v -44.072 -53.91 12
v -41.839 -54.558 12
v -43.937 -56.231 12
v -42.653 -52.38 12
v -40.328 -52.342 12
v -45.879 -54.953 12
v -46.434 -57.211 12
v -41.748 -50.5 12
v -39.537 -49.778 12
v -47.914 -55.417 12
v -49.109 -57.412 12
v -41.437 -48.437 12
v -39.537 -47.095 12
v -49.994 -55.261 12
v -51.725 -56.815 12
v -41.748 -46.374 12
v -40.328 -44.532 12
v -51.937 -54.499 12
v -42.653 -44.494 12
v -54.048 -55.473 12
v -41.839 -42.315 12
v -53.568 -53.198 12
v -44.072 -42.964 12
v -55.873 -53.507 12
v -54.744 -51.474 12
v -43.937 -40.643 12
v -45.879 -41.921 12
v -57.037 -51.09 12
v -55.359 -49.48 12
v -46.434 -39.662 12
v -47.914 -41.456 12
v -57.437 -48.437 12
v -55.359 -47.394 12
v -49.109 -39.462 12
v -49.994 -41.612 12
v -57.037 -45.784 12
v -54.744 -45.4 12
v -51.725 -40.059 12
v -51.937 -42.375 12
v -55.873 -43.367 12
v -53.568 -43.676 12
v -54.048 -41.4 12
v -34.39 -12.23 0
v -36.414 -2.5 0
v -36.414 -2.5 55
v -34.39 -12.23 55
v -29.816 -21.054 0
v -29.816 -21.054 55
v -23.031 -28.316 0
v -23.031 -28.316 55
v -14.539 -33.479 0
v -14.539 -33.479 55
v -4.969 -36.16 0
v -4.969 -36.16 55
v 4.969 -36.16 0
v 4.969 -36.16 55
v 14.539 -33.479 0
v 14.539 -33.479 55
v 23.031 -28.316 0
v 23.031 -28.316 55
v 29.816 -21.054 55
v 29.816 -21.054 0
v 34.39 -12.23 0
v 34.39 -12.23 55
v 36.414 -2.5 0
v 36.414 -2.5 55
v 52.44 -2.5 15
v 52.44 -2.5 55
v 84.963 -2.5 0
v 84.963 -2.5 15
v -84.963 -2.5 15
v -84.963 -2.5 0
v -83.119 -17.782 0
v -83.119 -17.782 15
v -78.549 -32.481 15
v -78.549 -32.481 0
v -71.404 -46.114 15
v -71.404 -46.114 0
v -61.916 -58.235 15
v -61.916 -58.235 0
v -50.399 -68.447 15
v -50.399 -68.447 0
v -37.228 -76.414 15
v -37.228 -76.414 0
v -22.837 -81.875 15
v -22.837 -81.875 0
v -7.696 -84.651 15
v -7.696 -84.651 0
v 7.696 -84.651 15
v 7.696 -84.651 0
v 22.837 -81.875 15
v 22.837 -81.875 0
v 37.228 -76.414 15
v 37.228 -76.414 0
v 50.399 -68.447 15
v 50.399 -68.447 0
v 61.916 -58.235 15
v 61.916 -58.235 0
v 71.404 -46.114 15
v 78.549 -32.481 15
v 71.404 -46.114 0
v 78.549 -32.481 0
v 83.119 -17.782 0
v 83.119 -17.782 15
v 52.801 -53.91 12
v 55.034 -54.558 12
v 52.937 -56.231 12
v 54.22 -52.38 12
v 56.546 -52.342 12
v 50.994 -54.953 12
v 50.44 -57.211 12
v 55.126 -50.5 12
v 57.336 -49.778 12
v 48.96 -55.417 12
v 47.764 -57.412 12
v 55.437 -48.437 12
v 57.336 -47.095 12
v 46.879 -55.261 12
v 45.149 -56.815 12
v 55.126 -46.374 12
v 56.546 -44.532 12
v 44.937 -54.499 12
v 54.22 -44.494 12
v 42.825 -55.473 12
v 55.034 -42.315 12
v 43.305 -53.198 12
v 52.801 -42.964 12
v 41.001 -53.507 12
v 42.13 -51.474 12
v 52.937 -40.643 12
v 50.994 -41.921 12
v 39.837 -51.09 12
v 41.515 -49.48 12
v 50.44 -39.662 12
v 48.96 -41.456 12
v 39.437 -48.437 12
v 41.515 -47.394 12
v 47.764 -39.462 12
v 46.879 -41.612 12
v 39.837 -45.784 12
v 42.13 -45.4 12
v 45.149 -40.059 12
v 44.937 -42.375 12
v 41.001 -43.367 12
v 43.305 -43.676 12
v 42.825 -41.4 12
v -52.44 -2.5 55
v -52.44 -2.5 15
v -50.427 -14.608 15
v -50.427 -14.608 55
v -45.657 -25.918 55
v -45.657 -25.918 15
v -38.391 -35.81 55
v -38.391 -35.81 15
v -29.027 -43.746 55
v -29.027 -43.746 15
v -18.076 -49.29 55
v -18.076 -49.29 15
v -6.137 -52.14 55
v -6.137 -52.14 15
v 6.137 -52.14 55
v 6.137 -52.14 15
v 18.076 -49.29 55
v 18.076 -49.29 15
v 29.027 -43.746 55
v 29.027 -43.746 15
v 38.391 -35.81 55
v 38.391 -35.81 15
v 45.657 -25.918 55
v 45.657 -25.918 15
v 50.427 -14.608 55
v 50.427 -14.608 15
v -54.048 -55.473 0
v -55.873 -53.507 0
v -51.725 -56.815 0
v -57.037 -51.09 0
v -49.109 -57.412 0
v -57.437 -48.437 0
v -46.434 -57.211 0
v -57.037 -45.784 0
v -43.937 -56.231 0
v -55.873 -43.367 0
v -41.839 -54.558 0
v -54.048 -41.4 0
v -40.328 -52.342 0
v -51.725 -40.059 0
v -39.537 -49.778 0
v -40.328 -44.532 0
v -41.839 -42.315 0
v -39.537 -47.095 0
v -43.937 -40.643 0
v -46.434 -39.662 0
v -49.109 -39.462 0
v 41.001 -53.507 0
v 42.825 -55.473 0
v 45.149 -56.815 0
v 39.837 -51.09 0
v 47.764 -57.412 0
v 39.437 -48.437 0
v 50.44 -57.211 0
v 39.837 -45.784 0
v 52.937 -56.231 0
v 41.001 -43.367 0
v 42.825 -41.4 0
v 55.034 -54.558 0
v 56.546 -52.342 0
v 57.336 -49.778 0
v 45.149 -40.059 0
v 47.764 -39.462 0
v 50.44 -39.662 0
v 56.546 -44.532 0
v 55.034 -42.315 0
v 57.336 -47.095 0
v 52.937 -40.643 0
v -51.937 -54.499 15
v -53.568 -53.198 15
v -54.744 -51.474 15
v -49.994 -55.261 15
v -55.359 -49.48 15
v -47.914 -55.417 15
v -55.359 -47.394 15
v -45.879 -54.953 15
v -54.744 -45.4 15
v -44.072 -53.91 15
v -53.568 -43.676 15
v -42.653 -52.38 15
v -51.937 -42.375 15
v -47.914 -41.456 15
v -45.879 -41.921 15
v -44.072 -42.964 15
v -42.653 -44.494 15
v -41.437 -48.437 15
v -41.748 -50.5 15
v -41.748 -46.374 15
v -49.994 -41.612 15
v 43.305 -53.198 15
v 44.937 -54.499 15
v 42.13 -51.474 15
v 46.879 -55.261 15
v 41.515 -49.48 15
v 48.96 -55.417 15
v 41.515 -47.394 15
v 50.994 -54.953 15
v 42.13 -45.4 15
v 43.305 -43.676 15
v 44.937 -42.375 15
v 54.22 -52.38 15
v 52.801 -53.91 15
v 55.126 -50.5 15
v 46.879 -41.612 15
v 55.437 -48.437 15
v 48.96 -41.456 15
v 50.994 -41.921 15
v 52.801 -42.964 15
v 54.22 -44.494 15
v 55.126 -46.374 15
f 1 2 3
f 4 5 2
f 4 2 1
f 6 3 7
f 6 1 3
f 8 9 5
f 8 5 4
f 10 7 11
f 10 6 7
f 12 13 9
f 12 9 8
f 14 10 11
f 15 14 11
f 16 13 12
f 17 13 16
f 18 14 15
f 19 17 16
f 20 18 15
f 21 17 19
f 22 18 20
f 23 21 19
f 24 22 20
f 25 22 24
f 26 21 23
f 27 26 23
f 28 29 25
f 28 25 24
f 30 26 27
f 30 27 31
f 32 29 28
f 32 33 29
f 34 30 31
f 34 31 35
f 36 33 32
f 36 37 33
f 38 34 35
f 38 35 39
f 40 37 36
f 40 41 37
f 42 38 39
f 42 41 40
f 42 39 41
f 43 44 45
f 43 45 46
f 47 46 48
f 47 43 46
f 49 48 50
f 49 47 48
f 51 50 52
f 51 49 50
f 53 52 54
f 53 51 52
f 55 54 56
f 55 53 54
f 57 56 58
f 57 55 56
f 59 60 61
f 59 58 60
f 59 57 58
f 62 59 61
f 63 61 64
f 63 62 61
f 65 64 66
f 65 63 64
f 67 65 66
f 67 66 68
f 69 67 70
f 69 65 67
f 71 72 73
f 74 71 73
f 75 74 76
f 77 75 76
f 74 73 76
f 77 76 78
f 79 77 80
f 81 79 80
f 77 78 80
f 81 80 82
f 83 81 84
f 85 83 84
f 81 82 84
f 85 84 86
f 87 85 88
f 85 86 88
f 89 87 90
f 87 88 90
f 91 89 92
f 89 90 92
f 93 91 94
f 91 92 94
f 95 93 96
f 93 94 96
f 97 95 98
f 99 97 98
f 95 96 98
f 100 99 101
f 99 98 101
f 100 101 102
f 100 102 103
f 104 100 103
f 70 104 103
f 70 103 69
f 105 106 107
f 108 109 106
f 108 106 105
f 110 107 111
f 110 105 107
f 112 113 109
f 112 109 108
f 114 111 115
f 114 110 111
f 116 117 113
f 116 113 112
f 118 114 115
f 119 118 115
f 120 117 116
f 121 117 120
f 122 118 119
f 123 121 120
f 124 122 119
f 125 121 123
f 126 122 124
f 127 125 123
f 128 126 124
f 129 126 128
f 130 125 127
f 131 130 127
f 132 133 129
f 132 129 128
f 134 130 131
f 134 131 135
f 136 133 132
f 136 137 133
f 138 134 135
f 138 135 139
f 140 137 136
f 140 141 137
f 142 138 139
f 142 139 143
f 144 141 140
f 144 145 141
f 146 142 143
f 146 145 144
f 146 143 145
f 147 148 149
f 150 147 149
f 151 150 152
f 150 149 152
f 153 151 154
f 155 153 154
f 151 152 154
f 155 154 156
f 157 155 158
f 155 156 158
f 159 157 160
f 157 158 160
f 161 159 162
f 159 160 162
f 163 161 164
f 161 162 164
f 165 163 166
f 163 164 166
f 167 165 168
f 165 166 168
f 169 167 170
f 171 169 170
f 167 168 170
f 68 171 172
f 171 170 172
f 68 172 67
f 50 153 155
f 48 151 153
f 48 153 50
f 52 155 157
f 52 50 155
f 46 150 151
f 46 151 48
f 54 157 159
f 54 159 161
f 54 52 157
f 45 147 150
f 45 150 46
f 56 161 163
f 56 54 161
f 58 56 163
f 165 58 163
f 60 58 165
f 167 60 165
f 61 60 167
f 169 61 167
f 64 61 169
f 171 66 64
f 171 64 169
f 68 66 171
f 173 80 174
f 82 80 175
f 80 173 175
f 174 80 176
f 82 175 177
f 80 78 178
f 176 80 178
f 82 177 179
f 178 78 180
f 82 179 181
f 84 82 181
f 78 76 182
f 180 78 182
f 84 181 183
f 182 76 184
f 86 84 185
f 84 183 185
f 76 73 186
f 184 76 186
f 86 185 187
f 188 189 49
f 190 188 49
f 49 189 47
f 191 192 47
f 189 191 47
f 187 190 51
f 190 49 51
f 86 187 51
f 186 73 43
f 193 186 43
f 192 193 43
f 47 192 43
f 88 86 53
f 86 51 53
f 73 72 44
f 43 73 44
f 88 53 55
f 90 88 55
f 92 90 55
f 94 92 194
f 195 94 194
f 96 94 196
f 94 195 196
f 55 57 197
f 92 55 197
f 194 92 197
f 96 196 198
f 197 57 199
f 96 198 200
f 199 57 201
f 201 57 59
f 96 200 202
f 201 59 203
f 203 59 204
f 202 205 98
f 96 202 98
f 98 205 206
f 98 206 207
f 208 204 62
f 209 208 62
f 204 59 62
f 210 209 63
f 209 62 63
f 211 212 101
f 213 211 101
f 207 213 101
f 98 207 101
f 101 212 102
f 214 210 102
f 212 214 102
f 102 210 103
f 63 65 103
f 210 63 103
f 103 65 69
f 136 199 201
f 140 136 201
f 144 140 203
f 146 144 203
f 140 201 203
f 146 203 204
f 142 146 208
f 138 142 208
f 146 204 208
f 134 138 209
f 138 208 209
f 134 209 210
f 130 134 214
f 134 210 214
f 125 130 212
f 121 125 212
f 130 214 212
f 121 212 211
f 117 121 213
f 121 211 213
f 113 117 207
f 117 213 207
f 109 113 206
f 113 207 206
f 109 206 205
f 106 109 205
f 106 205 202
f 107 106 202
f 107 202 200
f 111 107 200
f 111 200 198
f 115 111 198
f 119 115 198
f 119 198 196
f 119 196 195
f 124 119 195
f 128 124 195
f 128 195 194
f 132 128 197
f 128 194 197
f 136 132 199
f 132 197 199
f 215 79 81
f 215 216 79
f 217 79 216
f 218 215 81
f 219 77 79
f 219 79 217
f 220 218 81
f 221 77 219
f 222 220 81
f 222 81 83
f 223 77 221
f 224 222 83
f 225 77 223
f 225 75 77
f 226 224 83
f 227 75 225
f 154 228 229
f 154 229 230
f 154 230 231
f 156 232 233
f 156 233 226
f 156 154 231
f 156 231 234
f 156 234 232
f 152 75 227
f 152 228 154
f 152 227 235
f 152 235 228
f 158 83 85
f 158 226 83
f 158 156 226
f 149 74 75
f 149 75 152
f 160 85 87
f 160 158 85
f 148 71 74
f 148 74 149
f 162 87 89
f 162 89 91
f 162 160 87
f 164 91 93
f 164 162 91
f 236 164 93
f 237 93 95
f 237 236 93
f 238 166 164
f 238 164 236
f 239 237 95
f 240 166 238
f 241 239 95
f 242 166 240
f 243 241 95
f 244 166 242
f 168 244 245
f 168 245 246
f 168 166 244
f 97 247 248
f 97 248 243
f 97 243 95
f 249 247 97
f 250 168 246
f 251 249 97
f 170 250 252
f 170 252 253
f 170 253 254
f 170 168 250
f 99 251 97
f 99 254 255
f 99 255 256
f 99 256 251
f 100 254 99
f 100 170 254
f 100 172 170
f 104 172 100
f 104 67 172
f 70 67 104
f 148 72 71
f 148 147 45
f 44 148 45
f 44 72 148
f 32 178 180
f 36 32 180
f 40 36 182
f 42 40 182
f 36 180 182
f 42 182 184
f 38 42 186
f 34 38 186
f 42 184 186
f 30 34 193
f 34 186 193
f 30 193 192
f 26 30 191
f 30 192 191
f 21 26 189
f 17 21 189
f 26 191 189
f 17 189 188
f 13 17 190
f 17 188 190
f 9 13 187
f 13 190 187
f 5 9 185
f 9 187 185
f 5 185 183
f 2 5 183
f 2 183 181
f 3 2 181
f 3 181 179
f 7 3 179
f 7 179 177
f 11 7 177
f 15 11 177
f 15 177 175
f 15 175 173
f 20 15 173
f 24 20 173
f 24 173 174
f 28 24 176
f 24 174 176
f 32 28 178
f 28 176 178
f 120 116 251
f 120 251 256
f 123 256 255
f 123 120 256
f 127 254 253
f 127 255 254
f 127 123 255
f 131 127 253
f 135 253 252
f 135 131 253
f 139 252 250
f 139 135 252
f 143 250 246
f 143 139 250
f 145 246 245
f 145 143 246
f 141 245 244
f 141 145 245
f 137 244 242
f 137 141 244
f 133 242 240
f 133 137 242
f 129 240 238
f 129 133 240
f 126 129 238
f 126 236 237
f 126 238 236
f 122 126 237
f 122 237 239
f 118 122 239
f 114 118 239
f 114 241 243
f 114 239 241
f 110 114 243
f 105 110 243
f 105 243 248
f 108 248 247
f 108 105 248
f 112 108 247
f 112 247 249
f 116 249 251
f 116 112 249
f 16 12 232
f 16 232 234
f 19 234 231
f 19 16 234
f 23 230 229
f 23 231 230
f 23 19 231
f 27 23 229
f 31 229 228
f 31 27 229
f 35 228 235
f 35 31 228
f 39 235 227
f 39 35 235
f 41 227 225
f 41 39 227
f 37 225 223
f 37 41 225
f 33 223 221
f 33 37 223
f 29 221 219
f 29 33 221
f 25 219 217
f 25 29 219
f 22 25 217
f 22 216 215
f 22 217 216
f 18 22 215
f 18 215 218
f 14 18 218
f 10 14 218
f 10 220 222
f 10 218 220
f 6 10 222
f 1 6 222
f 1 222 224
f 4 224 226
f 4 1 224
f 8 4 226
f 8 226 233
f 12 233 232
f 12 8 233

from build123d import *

# Parameters (mm, degrees)
SKETCH1_R               = 85
BOSS_EXTRUDE1_DEPTH     = 15
SKETCH2_R               = 52.5
BOSS_EXTRUDE2_DEPTH     = 40
CUT_EXTRUDE1_DEPTH      = 133.193040664
CUT_EXTRUDE1_DEPTH_BACK = 133.193040664
SKETCH3_R               = 36.5
CUT_EXTRUDE2_DEPTH      = 133.193040664
CUT_EXTRUDE2_DEPTH_BACK = 133.193040664
SKETCH4_W               = 179.422325272
SKETCH4_H               = 89.951571234
CUT_EXTRUDE3_DEPTH      = 133.193040664
CUT_EXTRUDE3_DEPTH_BACK = 133.193040664
SKETCH5_W               = 208.750471757
SKETCH5_H               = 2.5
CUT_EXTRUDE4_DEPTH      = 127.663925409
CUT_EXTRUDE4_DEPTH_BACK = 127.663925409
SKETCH6_R               = 7
SKETCH8_R               = 9
CUT_EXTRUDE5_DEPTH      = 12


with BuildPart() as part:
    # Sketch1 → Boss-Extrude1 (new body)
    with BuildSketch(Plane.XY):
        Circle(SKETCH1_R)
    extrude(amount=BOSS_EXTRUDE1_DEPTH)

    # Sketch2 → Boss-Extrude2 (add)
    with BuildSketch(Plane.XY.offset(15)):
        Circle(SKETCH2_R)
    extrude(amount=BOSS_EXTRUDE2_DEPTH)

    # Sketch3 → Cut-Extrude1 (cut, two sides: drawn at the far end of the back side and taken through both)
    with BuildSketch(Plane.XY.offset(55).offset(-CUT_EXTRUDE1_DEPTH_BACK)):
        Circle(SKETCH3_R)
    extrude(amount=CUT_EXTRUDE1_DEPTH + CUT_EXTRUDE1_DEPTH_BACK, mode=Mode.SUBTRACT)

    # Sketch4 → Cut-Extrude2 (cut, two sides: drawn at the far end of the back side and taken through both)
    with BuildSketch(Plane.XY.offset(55).offset(-CUT_EXTRUDE2_DEPTH_BACK)):
        with Locations((-4.711162636, 44.975785617)):
            Rectangle(SKETCH4_W, SKETCH4_H)
    extrude(amount=CUT_EXTRUDE2_DEPTH + CUT_EXTRUDE2_DEPTH_BACK, mode=Mode.SUBTRACT)

    # Sketch5 → Cut-Extrude3 (cut, two sides: drawn at the far end of the back side and taken through both)
    with BuildSketch(Plane.XY.offset(55).offset(-CUT_EXTRUDE3_DEPTH_BACK)):
        with Locations((-19.375235879, -1.25)):
            Rectangle(SKETCH5_W, SKETCH5_H)
    extrude(amount=CUT_EXTRUDE3_DEPTH + CUT_EXTRUDE3_DEPTH_BACK, mode=Mode.SUBTRACT)

    # Sketch6 → Cut-Extrude4 (cut, two sides: drawn at the far end of the back side and taken through both)
    with BuildSketch(Plane.XY.offset(15).offset(-CUT_EXTRUDE4_DEPTH_BACK)):
        with Locations((48.436814511, -48.436814511)):
            Circle(SKETCH6_R)
        with Locations((-48.436814511, -48.436814511)):
            Circle(SKETCH6_R)
    extrude(amount=CUT_EXTRUDE4_DEPTH + CUT_EXTRUDE4_DEPTH_BACK, mode=Mode.SUBTRACT)

    # Sketch8 → Cut-Extrude5 (cut)
    with BuildSketch(Plane(origin=(0, 0, 0), x_dir=(-1, 0, 0), z_dir=(0, 0, -1))):
        with Locations((-48.436814511, -48.436814511)):
            Circle(SKETCH8_R)
        with Locations((48.436814511, -48.436814511)):
            Circle(SKETCH8_R)
    extrude(amount=-CUT_EXTRUDE5_DEPTH, mode=Mode.SUBTRACT)


solid = part.part
